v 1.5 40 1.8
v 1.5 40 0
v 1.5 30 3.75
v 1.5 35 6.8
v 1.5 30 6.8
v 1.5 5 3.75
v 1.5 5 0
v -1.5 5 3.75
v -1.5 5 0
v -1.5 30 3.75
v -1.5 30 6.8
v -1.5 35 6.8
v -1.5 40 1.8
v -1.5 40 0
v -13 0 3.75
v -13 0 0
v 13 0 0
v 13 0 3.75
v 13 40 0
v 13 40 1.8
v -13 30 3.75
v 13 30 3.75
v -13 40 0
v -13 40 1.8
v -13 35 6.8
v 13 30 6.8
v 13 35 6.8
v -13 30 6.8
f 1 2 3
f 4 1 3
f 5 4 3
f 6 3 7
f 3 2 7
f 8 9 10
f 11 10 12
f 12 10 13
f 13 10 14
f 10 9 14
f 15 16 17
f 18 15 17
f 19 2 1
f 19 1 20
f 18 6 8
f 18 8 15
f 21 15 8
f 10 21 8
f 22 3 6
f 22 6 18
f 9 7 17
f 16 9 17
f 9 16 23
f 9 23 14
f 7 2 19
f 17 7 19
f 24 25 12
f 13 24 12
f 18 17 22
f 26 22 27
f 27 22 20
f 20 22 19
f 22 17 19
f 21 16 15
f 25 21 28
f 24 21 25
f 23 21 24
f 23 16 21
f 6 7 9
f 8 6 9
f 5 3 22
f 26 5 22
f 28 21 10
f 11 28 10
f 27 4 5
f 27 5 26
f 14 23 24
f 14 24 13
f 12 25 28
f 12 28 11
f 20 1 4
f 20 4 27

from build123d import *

# Parameters (mm, degrees)
F0_W     = 11.5
F0_H     = 25
F0_W_2   = 1.5
F0_H_2   = 5
F1_DEPTH = 3.75
F0_H_3   = 10
F2_DEPTH = 6.8
F3_SIZE  = 5


with BuildPart() as f1:
    # F0 (on Top) → F1 (new body)
    with BuildSketch(Plane.XY):
        with Locations((-7.25, 17.5)):
            Rectangle(F0_W, F0_H)
        Polygon((1.5, 30), (1.5, 5), (13, 4.9315184347), (13, 30), align=None)
        Polygon((1.5, 5), (1.5, 0), (13, 0), (13, 4.9315184347), align=None)
        with Locations((0.75, 2.5)):
            Rectangle(F0_W_2, F0_H_2)
        with Locations((-0.75, 2.5)):
            Rectangle(F0_W_2, F0_H_2)
        with Locations((-7.25, 2.5)):
            Rectangle(F0_W, F0_H_2)
    extrude(amount=F1_DEPTH)

    # F0 (on Top) → F2 (join)
    with BuildSketch(Plane.XY):
        with Locations((-7.25, 35)):
            Rectangle(F0_W, F0_H_3)
        with Locations((7.25, 35)):
            Rectangle(F0_W, F0_H_3)
    extrude(amount=F2_DEPTH)

    # F3
    f3_edges = [f1.edges().sort_by_distance(p)[0] for p in [
        (-7.25, 40, 6.8),
        (7.25, 40, 6.8),
    ]]
    chamfer(f3_edges, length=F3_SIZE)


solid = f1.part
